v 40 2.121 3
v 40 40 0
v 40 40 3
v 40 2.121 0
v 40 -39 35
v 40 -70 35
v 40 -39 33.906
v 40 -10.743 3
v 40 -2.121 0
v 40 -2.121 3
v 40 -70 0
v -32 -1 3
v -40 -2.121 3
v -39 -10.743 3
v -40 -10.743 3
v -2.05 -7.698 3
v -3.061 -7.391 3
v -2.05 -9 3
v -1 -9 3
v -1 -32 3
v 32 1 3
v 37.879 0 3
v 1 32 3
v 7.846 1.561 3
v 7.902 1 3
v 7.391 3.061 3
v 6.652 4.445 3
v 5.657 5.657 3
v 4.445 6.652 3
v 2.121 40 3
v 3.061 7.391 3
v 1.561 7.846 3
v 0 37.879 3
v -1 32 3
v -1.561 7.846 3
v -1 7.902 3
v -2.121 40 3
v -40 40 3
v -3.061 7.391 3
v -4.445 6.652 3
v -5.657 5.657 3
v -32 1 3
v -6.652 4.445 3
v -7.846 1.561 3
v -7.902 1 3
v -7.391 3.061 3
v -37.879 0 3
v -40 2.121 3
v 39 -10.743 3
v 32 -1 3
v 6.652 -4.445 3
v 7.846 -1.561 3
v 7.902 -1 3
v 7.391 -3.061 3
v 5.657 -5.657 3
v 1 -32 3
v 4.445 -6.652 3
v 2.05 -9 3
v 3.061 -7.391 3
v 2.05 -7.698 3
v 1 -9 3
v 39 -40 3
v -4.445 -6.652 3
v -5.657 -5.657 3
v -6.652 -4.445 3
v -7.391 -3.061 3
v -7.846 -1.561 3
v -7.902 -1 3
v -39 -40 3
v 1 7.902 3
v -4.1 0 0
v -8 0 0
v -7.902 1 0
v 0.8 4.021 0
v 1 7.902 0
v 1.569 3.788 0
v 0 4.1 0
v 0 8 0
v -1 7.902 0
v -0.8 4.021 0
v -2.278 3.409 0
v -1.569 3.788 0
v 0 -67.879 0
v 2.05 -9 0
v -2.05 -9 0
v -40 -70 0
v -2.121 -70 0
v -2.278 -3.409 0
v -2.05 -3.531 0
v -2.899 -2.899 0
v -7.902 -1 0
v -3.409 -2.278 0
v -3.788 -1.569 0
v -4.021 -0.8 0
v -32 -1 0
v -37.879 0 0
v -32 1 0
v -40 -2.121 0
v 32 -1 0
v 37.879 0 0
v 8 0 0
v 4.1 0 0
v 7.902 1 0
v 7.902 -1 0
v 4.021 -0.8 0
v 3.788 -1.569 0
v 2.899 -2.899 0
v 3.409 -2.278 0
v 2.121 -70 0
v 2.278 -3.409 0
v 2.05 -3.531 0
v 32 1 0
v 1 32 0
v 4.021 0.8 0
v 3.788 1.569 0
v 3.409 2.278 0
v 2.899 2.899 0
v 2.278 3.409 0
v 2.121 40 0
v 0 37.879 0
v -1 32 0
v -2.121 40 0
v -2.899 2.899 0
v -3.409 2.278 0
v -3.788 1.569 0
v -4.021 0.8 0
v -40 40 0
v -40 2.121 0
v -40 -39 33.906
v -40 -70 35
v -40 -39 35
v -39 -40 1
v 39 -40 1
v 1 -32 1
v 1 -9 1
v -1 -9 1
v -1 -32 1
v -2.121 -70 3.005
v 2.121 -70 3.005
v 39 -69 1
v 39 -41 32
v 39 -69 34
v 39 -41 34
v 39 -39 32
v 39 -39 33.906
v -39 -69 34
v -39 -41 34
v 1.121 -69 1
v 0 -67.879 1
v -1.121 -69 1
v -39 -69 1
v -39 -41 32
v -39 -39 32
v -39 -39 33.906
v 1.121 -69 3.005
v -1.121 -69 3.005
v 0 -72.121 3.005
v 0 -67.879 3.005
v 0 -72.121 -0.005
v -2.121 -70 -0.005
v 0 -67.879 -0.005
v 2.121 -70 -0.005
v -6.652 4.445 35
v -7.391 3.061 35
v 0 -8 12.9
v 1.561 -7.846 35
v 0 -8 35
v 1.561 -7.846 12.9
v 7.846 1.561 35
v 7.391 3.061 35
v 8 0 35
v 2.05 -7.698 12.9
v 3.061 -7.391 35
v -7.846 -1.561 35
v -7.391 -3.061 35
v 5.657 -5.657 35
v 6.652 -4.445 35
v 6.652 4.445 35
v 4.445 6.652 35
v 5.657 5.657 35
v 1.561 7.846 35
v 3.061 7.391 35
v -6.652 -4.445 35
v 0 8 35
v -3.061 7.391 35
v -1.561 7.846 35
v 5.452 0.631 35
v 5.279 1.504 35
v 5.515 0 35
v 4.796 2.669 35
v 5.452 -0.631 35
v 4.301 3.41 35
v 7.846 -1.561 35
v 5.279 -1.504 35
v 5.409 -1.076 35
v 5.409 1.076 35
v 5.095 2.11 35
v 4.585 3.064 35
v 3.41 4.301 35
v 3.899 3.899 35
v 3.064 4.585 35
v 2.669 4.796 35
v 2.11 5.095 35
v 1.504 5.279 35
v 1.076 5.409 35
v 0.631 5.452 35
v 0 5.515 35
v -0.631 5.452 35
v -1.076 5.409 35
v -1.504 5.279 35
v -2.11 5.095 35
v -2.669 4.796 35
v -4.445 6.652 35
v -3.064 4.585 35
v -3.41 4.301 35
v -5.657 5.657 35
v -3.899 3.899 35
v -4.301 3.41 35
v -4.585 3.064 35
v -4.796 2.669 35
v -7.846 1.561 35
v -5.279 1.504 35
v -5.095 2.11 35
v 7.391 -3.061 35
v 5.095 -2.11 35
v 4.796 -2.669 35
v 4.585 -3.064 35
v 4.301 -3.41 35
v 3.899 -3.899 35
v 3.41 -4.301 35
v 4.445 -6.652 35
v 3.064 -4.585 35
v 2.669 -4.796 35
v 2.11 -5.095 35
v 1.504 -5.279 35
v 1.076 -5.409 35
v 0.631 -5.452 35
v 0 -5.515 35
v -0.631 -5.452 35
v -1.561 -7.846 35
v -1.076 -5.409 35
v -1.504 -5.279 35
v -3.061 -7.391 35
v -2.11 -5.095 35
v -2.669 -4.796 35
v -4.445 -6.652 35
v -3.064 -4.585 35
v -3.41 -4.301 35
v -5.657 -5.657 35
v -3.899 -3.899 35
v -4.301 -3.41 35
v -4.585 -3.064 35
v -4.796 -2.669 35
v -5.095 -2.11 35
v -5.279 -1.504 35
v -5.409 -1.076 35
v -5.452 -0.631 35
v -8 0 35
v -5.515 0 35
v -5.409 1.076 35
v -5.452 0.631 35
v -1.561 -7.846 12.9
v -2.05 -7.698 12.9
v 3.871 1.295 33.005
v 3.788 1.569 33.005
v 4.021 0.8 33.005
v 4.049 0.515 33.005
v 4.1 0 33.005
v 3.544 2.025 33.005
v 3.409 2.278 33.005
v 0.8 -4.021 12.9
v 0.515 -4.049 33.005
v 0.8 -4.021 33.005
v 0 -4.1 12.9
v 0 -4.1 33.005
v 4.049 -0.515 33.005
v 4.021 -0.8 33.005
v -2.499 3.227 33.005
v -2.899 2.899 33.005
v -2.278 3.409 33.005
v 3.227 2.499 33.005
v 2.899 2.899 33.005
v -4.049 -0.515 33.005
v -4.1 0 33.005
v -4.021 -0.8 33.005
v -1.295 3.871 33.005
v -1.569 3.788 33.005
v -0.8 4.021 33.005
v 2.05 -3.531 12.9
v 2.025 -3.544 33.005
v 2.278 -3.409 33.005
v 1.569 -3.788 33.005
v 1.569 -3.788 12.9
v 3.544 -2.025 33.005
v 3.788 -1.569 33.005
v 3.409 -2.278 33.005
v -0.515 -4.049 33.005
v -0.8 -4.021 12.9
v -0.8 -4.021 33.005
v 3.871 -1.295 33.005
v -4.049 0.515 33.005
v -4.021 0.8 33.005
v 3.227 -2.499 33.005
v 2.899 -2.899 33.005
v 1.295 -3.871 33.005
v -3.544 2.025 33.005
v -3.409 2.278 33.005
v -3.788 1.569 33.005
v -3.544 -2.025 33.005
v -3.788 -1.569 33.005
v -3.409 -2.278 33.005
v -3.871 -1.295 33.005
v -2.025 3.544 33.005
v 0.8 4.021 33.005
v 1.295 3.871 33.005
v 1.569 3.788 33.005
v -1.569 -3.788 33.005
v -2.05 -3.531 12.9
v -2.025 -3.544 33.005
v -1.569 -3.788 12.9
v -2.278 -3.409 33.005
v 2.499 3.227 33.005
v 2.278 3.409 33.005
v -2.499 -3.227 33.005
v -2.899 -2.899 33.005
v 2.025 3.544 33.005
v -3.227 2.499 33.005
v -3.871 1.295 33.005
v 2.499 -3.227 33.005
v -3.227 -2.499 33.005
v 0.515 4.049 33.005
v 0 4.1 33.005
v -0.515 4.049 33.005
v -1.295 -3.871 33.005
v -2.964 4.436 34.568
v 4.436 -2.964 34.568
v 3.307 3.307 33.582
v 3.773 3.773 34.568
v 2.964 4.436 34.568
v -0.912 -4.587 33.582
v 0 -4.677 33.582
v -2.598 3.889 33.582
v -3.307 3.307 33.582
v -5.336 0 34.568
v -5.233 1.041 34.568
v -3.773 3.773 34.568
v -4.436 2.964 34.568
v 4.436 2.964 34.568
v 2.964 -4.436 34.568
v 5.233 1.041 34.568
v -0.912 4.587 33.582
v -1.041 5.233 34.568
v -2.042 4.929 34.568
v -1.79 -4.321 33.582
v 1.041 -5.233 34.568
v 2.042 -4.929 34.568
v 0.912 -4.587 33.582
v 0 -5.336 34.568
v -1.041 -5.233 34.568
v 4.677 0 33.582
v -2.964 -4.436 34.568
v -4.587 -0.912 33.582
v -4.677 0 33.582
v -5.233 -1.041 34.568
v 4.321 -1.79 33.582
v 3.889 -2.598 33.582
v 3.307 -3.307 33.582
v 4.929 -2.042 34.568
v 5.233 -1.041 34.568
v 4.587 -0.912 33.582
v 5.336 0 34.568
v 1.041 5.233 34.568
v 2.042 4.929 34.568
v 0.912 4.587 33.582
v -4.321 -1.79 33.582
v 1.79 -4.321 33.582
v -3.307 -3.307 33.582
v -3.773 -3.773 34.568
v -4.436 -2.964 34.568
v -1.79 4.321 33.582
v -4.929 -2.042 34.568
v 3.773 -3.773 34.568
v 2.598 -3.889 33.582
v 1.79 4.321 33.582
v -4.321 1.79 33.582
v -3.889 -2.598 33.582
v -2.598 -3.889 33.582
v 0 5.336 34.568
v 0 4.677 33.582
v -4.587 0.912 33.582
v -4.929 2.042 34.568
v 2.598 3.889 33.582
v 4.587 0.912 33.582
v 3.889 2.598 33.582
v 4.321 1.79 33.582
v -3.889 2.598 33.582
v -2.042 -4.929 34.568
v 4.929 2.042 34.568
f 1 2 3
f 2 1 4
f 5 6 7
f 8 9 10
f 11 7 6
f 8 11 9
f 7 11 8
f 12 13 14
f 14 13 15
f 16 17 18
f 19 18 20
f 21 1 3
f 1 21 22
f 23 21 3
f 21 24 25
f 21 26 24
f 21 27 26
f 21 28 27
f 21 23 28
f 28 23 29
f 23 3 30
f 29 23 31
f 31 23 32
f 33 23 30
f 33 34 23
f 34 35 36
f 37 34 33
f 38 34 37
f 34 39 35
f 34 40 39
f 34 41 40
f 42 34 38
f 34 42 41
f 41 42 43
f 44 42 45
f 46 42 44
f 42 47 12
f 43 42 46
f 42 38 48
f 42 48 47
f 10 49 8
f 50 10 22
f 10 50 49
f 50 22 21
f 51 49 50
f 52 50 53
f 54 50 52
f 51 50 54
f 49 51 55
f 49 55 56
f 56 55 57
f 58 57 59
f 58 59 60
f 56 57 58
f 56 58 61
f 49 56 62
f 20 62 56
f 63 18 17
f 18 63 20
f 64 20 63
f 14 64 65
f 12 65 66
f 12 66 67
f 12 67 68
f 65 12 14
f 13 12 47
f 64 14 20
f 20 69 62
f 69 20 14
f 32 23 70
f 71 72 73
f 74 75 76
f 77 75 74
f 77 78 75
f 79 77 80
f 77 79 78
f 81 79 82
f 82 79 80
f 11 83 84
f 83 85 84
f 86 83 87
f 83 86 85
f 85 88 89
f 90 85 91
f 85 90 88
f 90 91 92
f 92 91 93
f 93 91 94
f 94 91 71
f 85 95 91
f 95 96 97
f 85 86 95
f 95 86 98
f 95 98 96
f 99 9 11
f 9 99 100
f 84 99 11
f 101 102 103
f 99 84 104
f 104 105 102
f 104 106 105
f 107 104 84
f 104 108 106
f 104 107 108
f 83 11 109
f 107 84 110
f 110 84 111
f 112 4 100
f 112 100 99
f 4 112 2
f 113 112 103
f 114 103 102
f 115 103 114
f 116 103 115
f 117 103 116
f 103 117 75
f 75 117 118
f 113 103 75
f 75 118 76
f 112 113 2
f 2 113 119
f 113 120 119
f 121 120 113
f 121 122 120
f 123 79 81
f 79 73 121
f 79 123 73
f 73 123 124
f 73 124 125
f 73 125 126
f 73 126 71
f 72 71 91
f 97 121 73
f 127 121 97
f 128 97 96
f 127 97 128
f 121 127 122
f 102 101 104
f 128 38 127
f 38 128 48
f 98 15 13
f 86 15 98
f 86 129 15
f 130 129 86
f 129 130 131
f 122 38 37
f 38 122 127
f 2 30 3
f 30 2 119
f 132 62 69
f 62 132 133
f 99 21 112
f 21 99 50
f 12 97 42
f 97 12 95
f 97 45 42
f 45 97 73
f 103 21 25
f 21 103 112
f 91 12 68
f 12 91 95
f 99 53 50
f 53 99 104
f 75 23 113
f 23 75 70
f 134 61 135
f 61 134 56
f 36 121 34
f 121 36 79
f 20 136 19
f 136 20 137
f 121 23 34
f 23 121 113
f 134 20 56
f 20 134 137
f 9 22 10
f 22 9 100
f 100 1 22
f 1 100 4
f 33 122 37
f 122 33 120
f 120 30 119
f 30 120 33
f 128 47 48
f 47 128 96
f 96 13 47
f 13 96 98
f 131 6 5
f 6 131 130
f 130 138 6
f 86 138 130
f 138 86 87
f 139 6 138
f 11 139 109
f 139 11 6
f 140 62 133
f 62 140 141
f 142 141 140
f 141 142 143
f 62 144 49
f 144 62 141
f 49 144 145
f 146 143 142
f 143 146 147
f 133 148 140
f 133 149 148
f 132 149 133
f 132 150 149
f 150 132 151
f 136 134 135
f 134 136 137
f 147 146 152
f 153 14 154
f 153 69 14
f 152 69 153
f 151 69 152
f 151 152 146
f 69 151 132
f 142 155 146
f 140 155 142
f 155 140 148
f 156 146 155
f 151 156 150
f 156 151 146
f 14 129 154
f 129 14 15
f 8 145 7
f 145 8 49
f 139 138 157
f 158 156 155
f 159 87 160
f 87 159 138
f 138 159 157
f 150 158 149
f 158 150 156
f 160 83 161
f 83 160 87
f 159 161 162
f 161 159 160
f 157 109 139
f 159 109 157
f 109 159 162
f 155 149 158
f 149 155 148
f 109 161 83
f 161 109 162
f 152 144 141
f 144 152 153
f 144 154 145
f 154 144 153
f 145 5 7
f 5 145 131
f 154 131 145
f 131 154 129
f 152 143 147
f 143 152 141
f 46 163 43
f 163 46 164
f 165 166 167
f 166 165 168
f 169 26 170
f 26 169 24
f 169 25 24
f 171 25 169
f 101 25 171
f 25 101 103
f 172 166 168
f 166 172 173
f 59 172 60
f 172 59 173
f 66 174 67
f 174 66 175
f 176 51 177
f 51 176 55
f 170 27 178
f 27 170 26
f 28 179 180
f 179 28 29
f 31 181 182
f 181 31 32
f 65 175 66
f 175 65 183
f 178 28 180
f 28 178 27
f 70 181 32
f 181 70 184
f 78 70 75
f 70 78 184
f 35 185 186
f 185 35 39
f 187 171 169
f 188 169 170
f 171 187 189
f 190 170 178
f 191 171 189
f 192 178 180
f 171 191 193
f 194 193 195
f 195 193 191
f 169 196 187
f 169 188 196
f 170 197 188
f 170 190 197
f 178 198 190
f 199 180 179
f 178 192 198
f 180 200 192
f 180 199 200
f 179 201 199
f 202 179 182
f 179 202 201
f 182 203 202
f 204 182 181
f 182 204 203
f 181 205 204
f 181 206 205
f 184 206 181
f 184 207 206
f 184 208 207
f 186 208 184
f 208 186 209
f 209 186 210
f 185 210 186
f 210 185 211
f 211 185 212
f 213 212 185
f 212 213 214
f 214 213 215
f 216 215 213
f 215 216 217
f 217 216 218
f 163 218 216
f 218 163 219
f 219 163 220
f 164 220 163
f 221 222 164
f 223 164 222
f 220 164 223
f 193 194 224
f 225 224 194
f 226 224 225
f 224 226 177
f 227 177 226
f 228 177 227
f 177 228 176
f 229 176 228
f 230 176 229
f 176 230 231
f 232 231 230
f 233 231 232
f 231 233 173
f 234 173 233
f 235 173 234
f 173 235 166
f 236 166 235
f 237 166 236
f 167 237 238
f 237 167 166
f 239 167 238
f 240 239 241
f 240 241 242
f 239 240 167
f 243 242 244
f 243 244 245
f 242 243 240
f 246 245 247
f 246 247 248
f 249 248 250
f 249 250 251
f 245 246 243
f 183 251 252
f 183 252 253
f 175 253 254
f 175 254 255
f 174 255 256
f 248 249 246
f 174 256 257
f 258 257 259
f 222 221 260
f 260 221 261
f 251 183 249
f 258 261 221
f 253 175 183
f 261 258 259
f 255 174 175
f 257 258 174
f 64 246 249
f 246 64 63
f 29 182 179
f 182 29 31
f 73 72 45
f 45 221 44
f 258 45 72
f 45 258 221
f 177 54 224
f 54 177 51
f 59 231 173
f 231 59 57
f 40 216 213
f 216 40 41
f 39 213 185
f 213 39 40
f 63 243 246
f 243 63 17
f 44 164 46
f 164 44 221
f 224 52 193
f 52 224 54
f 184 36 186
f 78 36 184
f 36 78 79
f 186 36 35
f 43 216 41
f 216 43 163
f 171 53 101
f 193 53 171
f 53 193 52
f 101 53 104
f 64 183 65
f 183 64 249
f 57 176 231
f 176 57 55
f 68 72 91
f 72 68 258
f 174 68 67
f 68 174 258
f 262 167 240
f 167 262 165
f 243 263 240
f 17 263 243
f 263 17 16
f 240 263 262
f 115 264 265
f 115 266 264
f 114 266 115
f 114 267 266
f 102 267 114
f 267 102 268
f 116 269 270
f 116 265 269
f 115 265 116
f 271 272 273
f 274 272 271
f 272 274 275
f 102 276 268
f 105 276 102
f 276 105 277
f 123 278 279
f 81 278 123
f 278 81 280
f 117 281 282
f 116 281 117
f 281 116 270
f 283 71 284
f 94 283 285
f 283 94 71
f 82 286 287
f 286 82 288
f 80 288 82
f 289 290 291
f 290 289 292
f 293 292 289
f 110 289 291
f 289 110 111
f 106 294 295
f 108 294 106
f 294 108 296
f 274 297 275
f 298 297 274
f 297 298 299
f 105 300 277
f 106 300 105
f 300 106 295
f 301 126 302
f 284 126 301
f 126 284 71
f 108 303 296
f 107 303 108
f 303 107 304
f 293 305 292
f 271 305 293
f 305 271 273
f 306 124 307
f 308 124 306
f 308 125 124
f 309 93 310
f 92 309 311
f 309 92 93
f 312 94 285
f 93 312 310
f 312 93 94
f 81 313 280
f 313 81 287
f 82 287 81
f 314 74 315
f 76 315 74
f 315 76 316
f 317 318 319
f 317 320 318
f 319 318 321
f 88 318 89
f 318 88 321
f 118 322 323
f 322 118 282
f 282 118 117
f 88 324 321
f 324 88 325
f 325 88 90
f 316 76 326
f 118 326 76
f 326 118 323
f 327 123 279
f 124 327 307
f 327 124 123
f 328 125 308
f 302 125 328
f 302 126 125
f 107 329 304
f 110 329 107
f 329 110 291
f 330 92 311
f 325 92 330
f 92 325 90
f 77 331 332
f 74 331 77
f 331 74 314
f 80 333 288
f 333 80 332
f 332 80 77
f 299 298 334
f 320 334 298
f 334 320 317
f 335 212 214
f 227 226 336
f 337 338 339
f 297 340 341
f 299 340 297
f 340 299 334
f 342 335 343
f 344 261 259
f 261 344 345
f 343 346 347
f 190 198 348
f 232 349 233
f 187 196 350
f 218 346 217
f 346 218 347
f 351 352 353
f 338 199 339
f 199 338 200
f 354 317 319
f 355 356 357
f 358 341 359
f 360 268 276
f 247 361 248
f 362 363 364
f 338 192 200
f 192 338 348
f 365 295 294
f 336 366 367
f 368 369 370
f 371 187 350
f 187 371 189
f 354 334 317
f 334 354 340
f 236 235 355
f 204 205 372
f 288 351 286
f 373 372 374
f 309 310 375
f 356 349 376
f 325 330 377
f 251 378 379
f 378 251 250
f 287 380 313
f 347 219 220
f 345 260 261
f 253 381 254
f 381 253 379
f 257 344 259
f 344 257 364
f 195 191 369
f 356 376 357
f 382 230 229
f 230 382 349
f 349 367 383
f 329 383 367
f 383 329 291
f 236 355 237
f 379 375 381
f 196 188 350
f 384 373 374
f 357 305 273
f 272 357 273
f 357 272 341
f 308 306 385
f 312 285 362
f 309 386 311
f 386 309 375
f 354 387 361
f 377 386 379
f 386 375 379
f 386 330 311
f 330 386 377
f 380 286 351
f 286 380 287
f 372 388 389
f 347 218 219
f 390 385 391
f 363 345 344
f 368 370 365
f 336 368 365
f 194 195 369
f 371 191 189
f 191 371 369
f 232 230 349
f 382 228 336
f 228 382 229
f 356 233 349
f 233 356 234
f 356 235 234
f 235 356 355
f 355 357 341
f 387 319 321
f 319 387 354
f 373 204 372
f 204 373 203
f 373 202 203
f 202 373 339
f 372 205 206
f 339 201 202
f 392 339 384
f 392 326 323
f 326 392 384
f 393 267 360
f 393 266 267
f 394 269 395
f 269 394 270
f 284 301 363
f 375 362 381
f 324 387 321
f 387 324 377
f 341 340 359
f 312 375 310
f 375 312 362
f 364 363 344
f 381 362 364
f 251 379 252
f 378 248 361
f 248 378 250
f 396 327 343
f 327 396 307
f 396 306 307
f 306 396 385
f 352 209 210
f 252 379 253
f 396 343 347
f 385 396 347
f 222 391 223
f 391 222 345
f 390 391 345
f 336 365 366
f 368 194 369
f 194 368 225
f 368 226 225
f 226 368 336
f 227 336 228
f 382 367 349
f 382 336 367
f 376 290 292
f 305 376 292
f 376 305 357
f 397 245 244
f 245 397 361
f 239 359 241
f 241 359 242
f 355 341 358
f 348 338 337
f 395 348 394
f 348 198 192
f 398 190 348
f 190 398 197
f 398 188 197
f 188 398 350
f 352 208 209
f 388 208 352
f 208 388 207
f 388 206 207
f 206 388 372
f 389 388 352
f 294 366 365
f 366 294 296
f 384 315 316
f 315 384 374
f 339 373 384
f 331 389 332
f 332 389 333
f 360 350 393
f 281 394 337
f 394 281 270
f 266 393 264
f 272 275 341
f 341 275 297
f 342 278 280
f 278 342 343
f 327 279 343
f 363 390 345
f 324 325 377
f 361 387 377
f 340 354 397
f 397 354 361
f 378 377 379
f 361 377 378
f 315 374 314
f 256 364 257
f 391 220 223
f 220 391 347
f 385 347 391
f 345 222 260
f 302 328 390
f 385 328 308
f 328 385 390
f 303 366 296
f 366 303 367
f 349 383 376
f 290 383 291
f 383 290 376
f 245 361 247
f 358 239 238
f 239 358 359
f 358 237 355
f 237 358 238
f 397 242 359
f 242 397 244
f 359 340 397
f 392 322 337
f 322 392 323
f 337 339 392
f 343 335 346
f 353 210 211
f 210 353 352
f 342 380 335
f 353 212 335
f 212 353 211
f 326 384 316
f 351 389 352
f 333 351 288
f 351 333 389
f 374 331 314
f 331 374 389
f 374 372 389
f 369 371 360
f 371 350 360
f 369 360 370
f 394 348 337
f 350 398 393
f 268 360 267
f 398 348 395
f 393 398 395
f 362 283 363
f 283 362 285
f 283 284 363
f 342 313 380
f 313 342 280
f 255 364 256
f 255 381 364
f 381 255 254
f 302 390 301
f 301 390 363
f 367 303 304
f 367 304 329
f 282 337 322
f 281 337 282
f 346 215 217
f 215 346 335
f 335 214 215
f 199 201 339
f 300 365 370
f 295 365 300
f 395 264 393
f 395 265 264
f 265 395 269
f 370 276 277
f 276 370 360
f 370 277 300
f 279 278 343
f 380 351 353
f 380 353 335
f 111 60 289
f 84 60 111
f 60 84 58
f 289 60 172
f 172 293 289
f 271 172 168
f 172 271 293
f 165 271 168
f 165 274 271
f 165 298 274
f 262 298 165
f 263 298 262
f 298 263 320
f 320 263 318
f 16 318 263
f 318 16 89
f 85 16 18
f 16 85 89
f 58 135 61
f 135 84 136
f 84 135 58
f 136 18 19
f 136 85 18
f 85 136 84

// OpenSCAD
// Drillguide and sawduct collector for drilling on wall
// By Leo Liang, 2018-7-28
//
// Remix on https://www.thingiverse.com/thing:3013962, by Coat, 08-jul-2018
// Licensed under the Creative Commons - Attribution license.

//Primary parameters
//diameter drill (mm), add a little tolerance
drill_diameter = 8.2;
//height of the  guidetube (mm)
guide_height = 35;
//width of the guidetube (mm)
guide_diameter = 16;
//thickness of the baseplate (mm)
plate_thick = 3;
//width of the baseplate (mm)
plate_width = 80;
// width of the sawdust collector (mm)
collector_width = 80; 
//depth of the sawdust collector (mm)
collector_depth = 30; 
//height of the sawdust collector (mm)
collector_height = 35; 
// thickness of the wall of the collector (mm)
collector_thick = 1;

module plate(w,t)
{
  translate([0,0,0.5 * plate_thick]) difference()
  {
    cube([w, w, t], center=true);
    cube([w/1.25, guidlinew, guide_height],center = true);
    cube([guidlinew, w/1.25, guide_height],center = true);
    
    translate([0.5*plate_width,0,-plate_thick/2])
      nodge();
    translate([0,0.5*plate_width,-plate_thick/2])
      nodge();
    translate([-0.5*plate_width,0,-plate_thick/2])
      nodge();
  }
} 

module nodge()
{
  translate([0,0,plate_thick/2]) rotate([0,0,45])
    cube([3,3,plate_thick+0.01], center=true);
}

module collector() {
  offset = min(collector_height, (plate_width-guide_diameter)/2);
  depth = collector_depth + offset;
  difference() {
    translate([0, offset/2, collector_height/2]) cube([collector_width, depth, collector_height], center=true);
    translate([0, offset/2+collector_thick, collector_height/2])
      cube([collector_width-collector_thick*2, depth, collector_height-collector_thick*2], center=true);
  	multmatrix(m=[[1, 0, 0, -collector_width/2-1],
  								[0, 1, -offset/collector_height, collector_depth/2+offset],
	  							[0, 0, 1, 0],
		  						[0, 0, 0, 1]])

      cube([collector_width+2, offset+1, collector_height+1]);
  }
  translate([0,offset/2-depth/2, 0]) nodge();
  // add a bean to strengthen thin wall
  translate([0, collector_depth/2, collector_height-1.5]) cube([collector_width, 2, 3], center=true);
}

//****************************************
//Main
//secondary parameters
$fn = 32;
guidlinew = min(2,drill_diameter/2);
dtop = (guide_diameter + drill_diameter)/2;
channel_height = min(guide_height/2, 10+plate_thick);

//The thing
difference()
{
  union()
  {
    color("red") cylinder(d = guide_diameter, h = guide_height);
    plate(plate_width,plate_thick);
    translate([0, -collector_depth/2-plate_width/2, 0]) collector();
  }  
  
  //drillhole
  cylinder(d = drill_diameter , h = guide_height*3, center = true);

  //edge in top drillguide to make it easier to insert drill
  translate([0,0,guide_height + dtop/5])
    sphere(d= dtop);

  //sawdust-channel
  translate([-drill_diameter/4,-1-guide_diameter/2,-0.1]) 
    cube([drill_diameter/2, guide_diameter/2, channel_height]); 
}
